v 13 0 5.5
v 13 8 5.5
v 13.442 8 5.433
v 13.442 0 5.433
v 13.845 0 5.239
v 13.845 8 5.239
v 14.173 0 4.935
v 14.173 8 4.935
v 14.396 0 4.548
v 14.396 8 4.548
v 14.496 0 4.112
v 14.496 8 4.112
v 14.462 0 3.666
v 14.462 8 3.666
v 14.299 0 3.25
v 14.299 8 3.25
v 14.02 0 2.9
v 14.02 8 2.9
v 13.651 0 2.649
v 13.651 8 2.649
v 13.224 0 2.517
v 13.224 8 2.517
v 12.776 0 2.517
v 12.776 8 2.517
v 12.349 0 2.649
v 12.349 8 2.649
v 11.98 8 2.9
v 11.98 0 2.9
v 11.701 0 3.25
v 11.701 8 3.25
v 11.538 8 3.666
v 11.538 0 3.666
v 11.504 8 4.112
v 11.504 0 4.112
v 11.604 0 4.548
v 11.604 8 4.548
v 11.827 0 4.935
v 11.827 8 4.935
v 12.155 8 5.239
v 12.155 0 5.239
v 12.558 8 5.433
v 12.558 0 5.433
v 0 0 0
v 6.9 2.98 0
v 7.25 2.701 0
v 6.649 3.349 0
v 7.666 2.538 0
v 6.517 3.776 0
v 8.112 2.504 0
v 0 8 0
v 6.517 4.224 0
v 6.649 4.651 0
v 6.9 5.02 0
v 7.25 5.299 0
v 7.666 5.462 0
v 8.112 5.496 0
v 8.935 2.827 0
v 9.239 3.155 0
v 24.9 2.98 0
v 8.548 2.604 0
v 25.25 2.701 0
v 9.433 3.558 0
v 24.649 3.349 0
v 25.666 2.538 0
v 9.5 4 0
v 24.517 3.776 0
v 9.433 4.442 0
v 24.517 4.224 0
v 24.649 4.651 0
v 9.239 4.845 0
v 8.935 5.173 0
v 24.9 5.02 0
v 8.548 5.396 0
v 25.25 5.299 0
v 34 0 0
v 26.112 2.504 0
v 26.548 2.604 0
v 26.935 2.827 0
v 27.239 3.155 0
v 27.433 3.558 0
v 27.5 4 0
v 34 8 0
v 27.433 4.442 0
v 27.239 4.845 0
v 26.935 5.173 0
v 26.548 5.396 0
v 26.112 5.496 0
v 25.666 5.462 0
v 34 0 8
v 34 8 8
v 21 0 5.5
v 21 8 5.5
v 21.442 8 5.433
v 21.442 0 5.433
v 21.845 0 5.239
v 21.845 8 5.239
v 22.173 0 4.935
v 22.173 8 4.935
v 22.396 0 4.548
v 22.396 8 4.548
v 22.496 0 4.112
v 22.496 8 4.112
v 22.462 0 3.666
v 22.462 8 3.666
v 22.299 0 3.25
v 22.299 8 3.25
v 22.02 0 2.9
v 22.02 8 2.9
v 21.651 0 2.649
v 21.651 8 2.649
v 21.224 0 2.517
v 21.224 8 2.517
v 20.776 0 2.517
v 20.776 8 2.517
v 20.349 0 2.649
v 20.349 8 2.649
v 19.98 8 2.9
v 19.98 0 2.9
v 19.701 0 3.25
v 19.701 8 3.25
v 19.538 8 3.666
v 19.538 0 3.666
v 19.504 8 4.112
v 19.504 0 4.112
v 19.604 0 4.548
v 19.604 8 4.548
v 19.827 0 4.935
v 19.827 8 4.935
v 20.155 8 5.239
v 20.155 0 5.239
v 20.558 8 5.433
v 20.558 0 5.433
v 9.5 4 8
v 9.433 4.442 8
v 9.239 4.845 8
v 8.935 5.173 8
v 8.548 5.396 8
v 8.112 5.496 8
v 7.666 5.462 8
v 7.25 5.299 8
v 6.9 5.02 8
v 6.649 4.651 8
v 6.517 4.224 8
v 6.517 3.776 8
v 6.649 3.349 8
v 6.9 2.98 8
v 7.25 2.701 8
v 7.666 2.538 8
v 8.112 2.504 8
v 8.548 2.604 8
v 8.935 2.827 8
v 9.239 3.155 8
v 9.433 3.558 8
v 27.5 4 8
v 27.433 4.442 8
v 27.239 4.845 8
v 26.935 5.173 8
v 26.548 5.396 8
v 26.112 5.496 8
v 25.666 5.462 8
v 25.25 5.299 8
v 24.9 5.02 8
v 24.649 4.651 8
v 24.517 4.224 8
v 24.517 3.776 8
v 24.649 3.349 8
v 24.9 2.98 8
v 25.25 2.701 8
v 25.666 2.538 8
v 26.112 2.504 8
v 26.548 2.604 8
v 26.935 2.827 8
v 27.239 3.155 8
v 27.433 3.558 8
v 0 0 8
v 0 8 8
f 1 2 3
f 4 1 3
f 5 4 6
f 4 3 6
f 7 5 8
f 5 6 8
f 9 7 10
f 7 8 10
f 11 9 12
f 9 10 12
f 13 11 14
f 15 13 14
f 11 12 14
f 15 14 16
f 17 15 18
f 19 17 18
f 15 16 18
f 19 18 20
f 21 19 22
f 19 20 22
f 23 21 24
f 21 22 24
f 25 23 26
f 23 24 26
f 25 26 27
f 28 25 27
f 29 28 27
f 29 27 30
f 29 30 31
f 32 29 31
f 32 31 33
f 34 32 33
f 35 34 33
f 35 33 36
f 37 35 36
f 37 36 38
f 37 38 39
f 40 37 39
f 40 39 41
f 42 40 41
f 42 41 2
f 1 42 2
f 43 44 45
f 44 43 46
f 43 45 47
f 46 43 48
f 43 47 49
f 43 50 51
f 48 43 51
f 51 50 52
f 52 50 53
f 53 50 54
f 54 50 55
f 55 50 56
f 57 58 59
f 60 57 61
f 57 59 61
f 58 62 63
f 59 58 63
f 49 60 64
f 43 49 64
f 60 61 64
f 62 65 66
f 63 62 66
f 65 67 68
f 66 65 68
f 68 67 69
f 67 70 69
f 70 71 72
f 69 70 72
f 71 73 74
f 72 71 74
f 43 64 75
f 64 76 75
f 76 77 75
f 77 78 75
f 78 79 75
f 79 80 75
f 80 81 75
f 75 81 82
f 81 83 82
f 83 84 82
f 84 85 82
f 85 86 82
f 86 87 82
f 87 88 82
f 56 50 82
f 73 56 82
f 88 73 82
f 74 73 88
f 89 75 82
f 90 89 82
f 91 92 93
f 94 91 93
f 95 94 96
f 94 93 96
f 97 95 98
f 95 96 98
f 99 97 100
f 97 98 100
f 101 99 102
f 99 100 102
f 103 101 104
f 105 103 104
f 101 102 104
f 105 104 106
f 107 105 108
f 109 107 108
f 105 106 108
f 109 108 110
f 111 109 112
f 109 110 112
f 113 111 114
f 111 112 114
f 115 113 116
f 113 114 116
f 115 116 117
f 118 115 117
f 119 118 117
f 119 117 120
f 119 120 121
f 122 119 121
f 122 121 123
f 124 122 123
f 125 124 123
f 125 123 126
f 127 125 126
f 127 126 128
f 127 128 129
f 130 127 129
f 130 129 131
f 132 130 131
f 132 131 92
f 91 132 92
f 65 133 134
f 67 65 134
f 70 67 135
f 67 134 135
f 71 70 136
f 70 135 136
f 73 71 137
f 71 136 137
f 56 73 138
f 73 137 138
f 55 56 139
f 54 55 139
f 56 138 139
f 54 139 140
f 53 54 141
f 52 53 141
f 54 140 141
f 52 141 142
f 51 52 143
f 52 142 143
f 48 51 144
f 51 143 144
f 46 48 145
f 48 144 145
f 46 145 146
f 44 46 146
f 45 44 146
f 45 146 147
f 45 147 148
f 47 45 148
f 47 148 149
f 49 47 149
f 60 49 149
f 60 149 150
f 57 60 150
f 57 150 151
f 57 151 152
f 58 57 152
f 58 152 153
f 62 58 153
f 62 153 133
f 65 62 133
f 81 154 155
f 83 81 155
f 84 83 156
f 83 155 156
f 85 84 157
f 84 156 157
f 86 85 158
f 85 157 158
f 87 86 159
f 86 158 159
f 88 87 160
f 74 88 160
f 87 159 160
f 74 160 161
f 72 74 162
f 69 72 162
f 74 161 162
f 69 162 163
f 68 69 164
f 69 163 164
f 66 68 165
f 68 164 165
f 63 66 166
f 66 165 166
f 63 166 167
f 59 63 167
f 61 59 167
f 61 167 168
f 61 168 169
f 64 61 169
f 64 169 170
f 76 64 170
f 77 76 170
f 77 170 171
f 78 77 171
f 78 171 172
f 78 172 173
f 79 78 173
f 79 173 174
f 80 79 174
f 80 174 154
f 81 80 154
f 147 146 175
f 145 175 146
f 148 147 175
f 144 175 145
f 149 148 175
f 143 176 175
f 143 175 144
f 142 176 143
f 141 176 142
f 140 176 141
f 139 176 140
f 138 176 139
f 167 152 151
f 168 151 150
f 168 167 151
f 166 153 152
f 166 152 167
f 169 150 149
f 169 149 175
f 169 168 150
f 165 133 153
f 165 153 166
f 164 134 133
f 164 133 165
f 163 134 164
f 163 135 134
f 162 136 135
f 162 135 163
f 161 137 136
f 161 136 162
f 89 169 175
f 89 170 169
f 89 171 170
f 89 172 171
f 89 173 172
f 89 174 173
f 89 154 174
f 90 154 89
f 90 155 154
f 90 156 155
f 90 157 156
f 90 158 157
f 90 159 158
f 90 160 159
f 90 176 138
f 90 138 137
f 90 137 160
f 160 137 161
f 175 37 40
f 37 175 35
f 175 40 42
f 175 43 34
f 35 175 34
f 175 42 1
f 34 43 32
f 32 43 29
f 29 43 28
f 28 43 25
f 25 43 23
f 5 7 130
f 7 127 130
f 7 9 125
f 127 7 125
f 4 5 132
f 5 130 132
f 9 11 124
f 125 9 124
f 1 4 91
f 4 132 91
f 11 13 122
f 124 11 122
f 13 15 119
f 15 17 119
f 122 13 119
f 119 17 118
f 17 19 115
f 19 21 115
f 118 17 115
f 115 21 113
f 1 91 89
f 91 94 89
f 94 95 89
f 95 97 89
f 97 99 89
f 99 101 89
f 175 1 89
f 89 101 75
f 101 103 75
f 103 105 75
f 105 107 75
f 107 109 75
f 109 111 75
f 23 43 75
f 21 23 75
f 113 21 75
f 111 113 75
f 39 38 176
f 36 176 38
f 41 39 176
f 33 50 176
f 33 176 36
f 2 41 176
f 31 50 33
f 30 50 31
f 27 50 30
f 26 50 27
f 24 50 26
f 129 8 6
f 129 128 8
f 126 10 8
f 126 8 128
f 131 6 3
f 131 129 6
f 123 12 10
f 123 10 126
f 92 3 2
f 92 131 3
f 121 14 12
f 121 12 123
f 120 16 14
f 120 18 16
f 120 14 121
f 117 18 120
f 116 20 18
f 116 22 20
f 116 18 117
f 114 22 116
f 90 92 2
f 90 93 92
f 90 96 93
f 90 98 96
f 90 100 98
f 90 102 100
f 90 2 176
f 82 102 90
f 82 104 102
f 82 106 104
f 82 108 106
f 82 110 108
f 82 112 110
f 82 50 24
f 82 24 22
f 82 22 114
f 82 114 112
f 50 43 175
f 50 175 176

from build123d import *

# Parameters (mm, degrees)
SKETCH_1_W          = 34
SKETCH_1_H          = 8
EXTRUDE_1_DEPTH     = 8
SKETCH_2_R          = 1.5
CUT_EXTRUDE_1_DEPTH = 36.832945734
SKETCH_3_R          = 1.5
CUT_EXTRUDE_2_DEPTH = 36.832945734


with BuildPart() as part:
    # 草图1 → 凸台-拉伸1 (new body)
    with BuildSketch(Plane.XY):
        with Locations((17, 4)):
            Rectangle(SKETCH_1_W, SKETCH_1_H)
    extrude(amount=EXTRUDE_1_DEPTH)

    # 草图2 → 切除-拉伸1 (cut, through all)
    with BuildSketch(Plane.XY.offset(8)):
        with Locations((8, 4)):
            Circle(SKETCH_2_R)
        with Locations((26, 4)):
            Circle(SKETCH_2_R)
    extrude(amount=-CUT_EXTRUDE_1_DEPTH, mode=Mode.SUBTRACT)

    # 草图3 → 切除-拉伸2 (cut, through all)
    with BuildSketch(Plane(origin=(0, 8, 0), x_dir=(1, 0, 0), z_dir=(0, 1, 0))):
        with Locations(Location((13, -4, 0), (0, 0, 270))):
            Circle(SKETCH_3_R)
        with Locations(Location((21, -4, 0), (0, 0, 270))):
            Circle(SKETCH_3_R)
    extrude(amount=-CUT_EXTRUDE_2_DEPTH, mode=Mode.SUBTRACT)


solid = part.part
